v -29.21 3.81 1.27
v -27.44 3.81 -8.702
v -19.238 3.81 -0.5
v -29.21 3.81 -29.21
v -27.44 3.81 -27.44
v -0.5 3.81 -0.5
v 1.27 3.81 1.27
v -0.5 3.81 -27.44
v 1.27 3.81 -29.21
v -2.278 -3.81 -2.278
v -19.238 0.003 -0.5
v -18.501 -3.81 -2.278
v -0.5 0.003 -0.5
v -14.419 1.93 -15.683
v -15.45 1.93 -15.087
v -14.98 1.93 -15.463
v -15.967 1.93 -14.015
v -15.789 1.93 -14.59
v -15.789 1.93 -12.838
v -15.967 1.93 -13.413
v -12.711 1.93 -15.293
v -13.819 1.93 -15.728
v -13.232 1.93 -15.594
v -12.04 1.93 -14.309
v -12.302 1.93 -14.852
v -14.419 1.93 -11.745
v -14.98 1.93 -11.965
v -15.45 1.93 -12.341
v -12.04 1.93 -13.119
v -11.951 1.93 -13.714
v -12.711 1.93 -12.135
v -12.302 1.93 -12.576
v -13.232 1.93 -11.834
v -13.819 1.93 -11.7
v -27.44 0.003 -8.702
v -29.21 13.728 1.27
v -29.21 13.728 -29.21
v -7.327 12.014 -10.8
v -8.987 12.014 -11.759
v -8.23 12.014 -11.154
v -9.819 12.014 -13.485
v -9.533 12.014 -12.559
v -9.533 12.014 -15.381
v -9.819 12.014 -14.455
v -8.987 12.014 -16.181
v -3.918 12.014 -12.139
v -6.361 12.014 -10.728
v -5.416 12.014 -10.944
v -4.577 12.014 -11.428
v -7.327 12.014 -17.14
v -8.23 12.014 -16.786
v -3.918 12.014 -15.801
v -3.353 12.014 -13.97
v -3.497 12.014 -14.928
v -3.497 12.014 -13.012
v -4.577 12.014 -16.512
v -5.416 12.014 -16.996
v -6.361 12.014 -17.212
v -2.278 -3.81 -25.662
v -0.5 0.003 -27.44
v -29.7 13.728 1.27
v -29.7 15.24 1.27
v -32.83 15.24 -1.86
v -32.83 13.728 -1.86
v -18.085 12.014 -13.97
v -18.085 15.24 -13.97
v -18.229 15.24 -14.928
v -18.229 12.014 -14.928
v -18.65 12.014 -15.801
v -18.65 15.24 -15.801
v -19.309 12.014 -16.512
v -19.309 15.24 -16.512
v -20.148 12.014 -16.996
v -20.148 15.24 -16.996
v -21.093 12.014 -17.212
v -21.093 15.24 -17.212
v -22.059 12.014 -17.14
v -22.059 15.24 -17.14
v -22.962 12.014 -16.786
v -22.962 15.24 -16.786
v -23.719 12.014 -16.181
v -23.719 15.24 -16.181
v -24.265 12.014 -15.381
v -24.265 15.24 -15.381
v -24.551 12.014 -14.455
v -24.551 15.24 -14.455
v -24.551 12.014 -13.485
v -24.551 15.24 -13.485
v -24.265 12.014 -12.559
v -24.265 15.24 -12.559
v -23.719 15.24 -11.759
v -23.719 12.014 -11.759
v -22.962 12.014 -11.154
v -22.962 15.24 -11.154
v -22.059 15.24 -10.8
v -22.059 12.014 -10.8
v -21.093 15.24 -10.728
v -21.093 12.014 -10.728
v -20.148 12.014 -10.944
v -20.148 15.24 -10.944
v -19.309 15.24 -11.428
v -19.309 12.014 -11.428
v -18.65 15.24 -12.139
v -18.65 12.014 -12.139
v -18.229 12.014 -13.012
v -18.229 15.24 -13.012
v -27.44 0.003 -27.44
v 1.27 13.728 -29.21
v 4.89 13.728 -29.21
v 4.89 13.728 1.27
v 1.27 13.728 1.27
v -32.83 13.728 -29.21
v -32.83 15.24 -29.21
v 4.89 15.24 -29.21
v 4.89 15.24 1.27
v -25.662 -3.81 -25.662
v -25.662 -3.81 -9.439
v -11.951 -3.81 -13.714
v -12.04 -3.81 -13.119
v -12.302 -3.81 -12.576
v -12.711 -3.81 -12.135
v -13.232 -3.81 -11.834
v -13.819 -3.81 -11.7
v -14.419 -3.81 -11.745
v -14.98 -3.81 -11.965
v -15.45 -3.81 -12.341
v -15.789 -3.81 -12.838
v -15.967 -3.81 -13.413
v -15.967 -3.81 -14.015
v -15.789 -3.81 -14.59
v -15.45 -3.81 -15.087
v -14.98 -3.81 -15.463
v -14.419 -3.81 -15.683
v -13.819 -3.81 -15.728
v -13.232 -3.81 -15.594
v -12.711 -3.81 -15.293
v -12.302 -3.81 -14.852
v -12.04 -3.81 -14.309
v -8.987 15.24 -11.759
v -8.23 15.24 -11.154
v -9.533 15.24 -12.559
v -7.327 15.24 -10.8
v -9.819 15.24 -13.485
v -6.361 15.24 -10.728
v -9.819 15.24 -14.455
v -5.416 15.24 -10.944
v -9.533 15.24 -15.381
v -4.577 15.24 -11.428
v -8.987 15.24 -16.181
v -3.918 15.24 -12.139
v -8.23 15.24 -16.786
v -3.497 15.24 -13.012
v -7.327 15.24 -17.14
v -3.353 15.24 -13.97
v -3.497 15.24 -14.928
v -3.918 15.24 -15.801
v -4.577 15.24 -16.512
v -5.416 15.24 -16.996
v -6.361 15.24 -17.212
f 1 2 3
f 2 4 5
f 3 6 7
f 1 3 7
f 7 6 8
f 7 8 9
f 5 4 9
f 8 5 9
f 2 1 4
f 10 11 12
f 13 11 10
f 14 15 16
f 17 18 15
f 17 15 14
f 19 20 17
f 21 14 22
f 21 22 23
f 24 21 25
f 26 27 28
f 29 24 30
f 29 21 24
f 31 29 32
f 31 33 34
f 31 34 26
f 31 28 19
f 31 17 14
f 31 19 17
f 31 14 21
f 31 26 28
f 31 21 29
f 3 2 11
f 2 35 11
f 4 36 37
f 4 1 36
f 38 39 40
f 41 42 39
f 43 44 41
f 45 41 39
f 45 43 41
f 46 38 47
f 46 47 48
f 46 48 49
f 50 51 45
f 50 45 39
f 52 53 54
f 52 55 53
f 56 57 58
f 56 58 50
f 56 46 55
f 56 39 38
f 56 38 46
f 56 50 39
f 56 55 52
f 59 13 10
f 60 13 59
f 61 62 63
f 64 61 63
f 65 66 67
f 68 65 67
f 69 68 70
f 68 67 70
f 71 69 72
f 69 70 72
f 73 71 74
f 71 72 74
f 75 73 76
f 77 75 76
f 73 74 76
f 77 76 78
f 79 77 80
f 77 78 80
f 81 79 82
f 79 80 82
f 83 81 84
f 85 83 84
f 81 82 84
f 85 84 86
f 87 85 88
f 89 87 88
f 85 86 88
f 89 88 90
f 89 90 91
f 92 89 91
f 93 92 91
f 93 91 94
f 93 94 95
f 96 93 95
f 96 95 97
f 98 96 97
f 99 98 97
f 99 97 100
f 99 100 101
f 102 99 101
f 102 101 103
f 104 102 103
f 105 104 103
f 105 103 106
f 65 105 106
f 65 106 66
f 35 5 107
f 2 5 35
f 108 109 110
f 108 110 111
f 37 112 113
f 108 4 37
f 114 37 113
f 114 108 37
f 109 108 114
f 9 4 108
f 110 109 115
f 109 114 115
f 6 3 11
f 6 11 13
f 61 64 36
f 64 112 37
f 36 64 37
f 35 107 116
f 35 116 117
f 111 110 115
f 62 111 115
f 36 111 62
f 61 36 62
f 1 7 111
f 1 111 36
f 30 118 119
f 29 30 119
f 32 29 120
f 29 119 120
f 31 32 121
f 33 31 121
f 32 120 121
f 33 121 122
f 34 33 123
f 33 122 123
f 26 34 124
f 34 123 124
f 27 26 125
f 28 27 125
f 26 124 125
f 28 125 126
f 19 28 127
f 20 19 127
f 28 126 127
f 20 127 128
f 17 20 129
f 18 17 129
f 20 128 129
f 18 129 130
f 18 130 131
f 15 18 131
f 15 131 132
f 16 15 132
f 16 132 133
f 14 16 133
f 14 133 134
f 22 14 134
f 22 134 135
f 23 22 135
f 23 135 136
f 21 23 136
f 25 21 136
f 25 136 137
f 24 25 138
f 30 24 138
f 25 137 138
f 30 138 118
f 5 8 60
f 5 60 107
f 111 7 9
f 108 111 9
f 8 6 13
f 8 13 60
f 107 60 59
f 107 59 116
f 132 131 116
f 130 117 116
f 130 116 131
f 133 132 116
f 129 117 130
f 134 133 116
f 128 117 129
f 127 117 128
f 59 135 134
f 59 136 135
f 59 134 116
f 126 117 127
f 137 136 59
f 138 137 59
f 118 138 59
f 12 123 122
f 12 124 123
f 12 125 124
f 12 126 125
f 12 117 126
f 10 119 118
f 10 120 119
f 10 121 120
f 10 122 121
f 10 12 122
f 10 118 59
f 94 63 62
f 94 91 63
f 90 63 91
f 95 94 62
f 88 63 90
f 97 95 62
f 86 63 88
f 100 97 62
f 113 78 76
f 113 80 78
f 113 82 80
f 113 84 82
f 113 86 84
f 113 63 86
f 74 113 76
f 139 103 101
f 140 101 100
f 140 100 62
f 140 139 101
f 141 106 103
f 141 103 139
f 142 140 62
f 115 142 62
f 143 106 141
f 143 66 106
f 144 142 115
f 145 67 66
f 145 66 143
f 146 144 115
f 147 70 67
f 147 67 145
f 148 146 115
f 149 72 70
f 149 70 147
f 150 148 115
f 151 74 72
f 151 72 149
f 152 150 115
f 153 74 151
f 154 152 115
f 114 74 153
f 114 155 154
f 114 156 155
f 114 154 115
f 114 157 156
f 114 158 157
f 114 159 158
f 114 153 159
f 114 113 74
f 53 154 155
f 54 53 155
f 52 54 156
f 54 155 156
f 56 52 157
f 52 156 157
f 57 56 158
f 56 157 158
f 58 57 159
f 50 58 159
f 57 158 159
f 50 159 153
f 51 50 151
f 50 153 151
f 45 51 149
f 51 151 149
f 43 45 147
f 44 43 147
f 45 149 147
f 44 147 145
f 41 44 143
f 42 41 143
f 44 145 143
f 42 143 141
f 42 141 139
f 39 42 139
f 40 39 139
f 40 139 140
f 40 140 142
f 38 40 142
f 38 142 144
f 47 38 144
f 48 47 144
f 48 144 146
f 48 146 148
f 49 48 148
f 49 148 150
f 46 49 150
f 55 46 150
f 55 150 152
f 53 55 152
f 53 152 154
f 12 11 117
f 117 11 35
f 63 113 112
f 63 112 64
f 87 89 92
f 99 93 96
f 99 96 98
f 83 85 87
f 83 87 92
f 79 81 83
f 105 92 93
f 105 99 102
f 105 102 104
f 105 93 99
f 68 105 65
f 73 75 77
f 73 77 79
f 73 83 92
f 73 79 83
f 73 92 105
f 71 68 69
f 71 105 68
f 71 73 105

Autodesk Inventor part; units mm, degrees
ref_plane "Work Plane2" through (0, 3.81, 0) normal (0, 1, 0) x (1, 0, 0)
sketch "Sketch2" plane through (0, 3.81, 0) normal (0, 1, 0) x (1, 0, 0)
  line L0 (-29.21, 29.21) -> (1.27, 29.21)
  line L1 (1.27, -1.27) -> (-29.21, -1.27)
  line L2 (-29.21, -1.27) -> (-29.21, 29.21)
  line L3 (1.27, -1.27) -> (1.27, 29.21)
  line L4 (-4.8761, 25.94) -> (-25.94, 25.94) projected
  line L5 (-25.94, 25.94) -> (-25.94, 0) projected
  line L6 (-25.94, 0) -> (0, 0) projected
  line L7 (0, 0) -> (0, 21.0639) projected
  dimension "d3" = 30.48
extrude "Extrusion2" add sketch "Sketch2" along normal blind 11.43
ref_plane "Work Plane1" through (0, -3.81, 0) normal (0, -1, 0) x (1, 0, 0)
ref_plane "Work Plane4" through (1.27, 3.81, -29.21) normal (0, 0, -1) x (-1, 0, 0)
sketch "Sketch6" plane through (1.27, 3.81, -29.21) normal (0, 0, -1) x (-1, 0, 0)
  line L0 (0, 11.43) -> (30.48, 11.43) projected
  line L1 (0, 11.43) -> (-7.239, 11.43)
  line L2 (-7.239, 11.43) -> (-7.239, 9.9183)
  line L3 (-7.239, 9.9183) -> (0, 9.9183)
  line L4 (0, 9.9183) -> (0, 11.43)
  line L5 (15.24, 11.43) -> (15.24, -7.62) construction
  line L6 (1.27, -7.62) -> (27.21, -7.62) construction
  line L7 (30.48, 11.43) -> (37.719, 11.43)
  line L8 (37.719, 11.43) -> (37.719, 9.9183)
  line L9 (37.719, 9.9183) -> (30.48, 9.9183)
  line L10 (30.48, 9.9183) -> (30.48, 11.43)
  point P0 (1.27, -3.81)
  dimension "d22" = 7.239
extrude "Extrusion6" add sketch "Sketch6" against normal up to surface (30.48 mm away)
ref_plane "Work Plane3" through (0, 15.24, 0) normal (0, 1, 0) x (1, 0, 0)
sketch "Sketch9" plane through (0, 15.24, 0) normal (0, 1, 0) x (1, 0, 0)
  line L0 (8.509, 29.21) -> (8.509, -1.27) construction
  line L1 (8.509, 13.97) -> (-36.449, 13.97) construction
  line L2 (-36.449, 29.21) -> (-36.449, -1.27) construction
  line L3 (-36.449, -1.27) -> (8.509, -1.27) construction
  line L4 (-13.97, -1.27) -> (-13.97, 29.21) construction
  line L5 (-36.449, 29.21) -> (8.509, 29.21) construction
  circle A0 centre (-21.336, 13.97) radius 3.2512
  circle A1 centre (-6.604, 13.97) radius 3.2512
  line L6 (-6.604, 13.97) -> (-21.336, 13.97) construction
  point P0 (0, 0)
  point P1 (-13.97, 13.97)
  point P2 (-13.97, 13.97)
  point P3 (-13.97, 13.97)
  point P4 (-13.97, 13.97)
  dimension "d25" = 14.732
extrude "Extrusion8" cut sketch "Sketch9" against normal blind 3.2258
ref_plane "Work Plane5" through (0, 15.24, 0) normal (0, 1, 0) x (1, 0, 0)
sketch "Sketch10" plane through (0, 15.24, 0) normal (0, 1, 0) x (1, 0, 0)
  line L0 (-29.21, -1.27) -> (-29.21, 29.21) projected
  line L1 (1.27, 29.21) -> (1.27, -1.27) projected
  line L2 (-36.449, 29.21) -> (-36.449, -1.27) projected
  line L3 (-36.449, 29.21) -> (8.509, 29.21) projected
  line L4 (-36.449, -1.27) -> (8.509, -1.27) projected
  line L5 (8.509, 29.21) -> (8.509, -1.27) projected
  line L6 (-29.21, 29.21) -> (-36.449, 29.21) projected
  line L7 (-29.21, 29.21) -> (-36.449, 29.21)
  line L8 (-32.8295, 29.21) -> (-32.8295, -1.27)
  line L9 (8.509, 29.21) -> (1.27, 29.21)
  line L10 (4.8895, 29.21) -> (4.8895, -1.27)
  line L11 (8.509, -1.27) -> (4.8895, -1.27)
  line L12 (8.509, 29.21) -> (8.509, -1.27) projected
  line L13 (8.509, 29.21) -> (8.509, -1.27)
  point P0 (0, 0)
extrude "Extrusion9" cut sketch "Sketch10" against normal blind 25.4 contours L4 L2 L3 L8 | L10 L3 L5 L4
sketch "Sketch18" plane through (0, 3.81, 0) normal (0, -1, 0) x (1, 0, 0)
  line L0 (1.27, 1.27) -> (1.27, -29.21) construction
  line L1 (1.27, -13.97) -> (-29.21, -13.97) construction
  line L2 (-29.21, -29.21) -> (-29.21, 1.27) construction
  line L3 (1.27, -29.21) -> (-29.21, -29.21) construction
  line L4 (-13.97, -29.21) -> (-13.97, 0) construction
  line L5 (0, -13.97) -> (-27.94, -13.97) construction
  line L6 (-13.97, 0) -> (-13.97, -27.94) construction
  line L7 (-13.97, -27.94) -> (-35.862, -27.94) construction
  line L8 (-20.7022, -26.44) -> (-37.4547, -26.44) construction
  line L9 (-27.44, -0.5) -> (-0.5, -0.5)
  line L10 (-0.5, -0.5) -> (-0.5, -27.44)
  line L11 (-0.5, -27.44) -> (-27.44, -27.44)
  line L12 (-27.44, -27.44) -> (-27.44, -0.5)
  line L13 (-27.44, -0.5) -> (-0.5, -27.44) construction
  line L14 (-0.5, -0.5) -> (-27.44, -27.44) construction
  line L15 (-27.44, -8.9624) -> (-18.9776, -0.5)
  point P0 (-13.97, -13.97)
  point P1 (-27.44, -20.8093)
  point P2 (-20.3093, -27.44)
  dimension "d66" = 1.27
  dimension "d72" = 26.94
extrude "Extrusion15" add sketch "Sketch18" along normal blind 7.62
sketch "Sketch19" plane through (0, -3.81, 0) normal (0, -1, 0) x (1, 0, 0)
  line L0 (-2.278, -2.278) -> (-2.278, -25.662) construction
  line L1 (-2.278, -13.97) -> (-25.662, -13.97) construction
  line L2 (-25.662, -25.662) -> (-25.662, -2.278) construction
  line L3 (-25.662, -2.278) -> (-2.278, -2.278) construction
  line L4 (-13.97, -2.278) -> (-13.97, -25.15) construction
  circle A0 centre (-13.97, -13.714) radius 2.0193
  point P0 (0, 0)
  point P1 (-25.412, -19.8229)
  dimension "d79" = 4.0386
extrude "Extrusion16" cut sketch "Sketch19" against normal blind 5.7404
sketch "Sketch21" plane through (0, -3.81, 0) normal (0, -1, 0) x (1, 0, 0)
  line L0 (-0.5, -0.5) -> (-27.44, -0.5) projected
  line L1 (-27.44, -0.5) -> (-27.44, -27.44) projected
  line L2 (-25.662, -2.278) -> (-27.44, -0.5) projected
  line L3 (-27.44, -8.7021) -> (-19.2379, -0.5)
  line L4 (-27.44, -8.7021) -> (-27.44, -0.5)
  point P0 (0, 0)
extrude "Extrusion18" cut sketch "Sketch21" against normal up to surface (7.62 mm away)
chamfer "Chamfer4" distance 1.778 angle 65 5 edges at (-9.869, -3.81, -0.5) (-23.339, -3.81, -4.601) (-27.44, -3.81, -18.071) (-13.97, -3.81, -27.44) (-0.5, -3.81, -13.97) measured on face at (-13.8889, -3.81, -23.5329)
sketch "Sketch22" plane through (0, 15.24, 0) normal (0, 1, 0) x (1, 0, 0)
  line L0 (-29.21, -1.27) -> (-32.8295, -1.27) projected
  line L1 (-32.8295, -1.27) -> (-29.972, 1.5875)
  line L2 (-32.8295, -1.27) -> (-28.7884, -1.27) construction
  line L3 (-29.6999, -1.27) -> (-32.8295, 1.8596)
  line L4 (-32.8295, -1.27) -> (-32.8295, 29.21) projected
  line L5 (-32.8295, 1.8596) -> (-32.8295, -1.27)
  point P0 (0, 0)
  dimension "d91" = 45
extrude "Extrusion19" cut sketch "Sketch22" against normal up to surface (1.5117 mm away)
properties part number "IPT_Header" material "Acetal Resin, Black"
